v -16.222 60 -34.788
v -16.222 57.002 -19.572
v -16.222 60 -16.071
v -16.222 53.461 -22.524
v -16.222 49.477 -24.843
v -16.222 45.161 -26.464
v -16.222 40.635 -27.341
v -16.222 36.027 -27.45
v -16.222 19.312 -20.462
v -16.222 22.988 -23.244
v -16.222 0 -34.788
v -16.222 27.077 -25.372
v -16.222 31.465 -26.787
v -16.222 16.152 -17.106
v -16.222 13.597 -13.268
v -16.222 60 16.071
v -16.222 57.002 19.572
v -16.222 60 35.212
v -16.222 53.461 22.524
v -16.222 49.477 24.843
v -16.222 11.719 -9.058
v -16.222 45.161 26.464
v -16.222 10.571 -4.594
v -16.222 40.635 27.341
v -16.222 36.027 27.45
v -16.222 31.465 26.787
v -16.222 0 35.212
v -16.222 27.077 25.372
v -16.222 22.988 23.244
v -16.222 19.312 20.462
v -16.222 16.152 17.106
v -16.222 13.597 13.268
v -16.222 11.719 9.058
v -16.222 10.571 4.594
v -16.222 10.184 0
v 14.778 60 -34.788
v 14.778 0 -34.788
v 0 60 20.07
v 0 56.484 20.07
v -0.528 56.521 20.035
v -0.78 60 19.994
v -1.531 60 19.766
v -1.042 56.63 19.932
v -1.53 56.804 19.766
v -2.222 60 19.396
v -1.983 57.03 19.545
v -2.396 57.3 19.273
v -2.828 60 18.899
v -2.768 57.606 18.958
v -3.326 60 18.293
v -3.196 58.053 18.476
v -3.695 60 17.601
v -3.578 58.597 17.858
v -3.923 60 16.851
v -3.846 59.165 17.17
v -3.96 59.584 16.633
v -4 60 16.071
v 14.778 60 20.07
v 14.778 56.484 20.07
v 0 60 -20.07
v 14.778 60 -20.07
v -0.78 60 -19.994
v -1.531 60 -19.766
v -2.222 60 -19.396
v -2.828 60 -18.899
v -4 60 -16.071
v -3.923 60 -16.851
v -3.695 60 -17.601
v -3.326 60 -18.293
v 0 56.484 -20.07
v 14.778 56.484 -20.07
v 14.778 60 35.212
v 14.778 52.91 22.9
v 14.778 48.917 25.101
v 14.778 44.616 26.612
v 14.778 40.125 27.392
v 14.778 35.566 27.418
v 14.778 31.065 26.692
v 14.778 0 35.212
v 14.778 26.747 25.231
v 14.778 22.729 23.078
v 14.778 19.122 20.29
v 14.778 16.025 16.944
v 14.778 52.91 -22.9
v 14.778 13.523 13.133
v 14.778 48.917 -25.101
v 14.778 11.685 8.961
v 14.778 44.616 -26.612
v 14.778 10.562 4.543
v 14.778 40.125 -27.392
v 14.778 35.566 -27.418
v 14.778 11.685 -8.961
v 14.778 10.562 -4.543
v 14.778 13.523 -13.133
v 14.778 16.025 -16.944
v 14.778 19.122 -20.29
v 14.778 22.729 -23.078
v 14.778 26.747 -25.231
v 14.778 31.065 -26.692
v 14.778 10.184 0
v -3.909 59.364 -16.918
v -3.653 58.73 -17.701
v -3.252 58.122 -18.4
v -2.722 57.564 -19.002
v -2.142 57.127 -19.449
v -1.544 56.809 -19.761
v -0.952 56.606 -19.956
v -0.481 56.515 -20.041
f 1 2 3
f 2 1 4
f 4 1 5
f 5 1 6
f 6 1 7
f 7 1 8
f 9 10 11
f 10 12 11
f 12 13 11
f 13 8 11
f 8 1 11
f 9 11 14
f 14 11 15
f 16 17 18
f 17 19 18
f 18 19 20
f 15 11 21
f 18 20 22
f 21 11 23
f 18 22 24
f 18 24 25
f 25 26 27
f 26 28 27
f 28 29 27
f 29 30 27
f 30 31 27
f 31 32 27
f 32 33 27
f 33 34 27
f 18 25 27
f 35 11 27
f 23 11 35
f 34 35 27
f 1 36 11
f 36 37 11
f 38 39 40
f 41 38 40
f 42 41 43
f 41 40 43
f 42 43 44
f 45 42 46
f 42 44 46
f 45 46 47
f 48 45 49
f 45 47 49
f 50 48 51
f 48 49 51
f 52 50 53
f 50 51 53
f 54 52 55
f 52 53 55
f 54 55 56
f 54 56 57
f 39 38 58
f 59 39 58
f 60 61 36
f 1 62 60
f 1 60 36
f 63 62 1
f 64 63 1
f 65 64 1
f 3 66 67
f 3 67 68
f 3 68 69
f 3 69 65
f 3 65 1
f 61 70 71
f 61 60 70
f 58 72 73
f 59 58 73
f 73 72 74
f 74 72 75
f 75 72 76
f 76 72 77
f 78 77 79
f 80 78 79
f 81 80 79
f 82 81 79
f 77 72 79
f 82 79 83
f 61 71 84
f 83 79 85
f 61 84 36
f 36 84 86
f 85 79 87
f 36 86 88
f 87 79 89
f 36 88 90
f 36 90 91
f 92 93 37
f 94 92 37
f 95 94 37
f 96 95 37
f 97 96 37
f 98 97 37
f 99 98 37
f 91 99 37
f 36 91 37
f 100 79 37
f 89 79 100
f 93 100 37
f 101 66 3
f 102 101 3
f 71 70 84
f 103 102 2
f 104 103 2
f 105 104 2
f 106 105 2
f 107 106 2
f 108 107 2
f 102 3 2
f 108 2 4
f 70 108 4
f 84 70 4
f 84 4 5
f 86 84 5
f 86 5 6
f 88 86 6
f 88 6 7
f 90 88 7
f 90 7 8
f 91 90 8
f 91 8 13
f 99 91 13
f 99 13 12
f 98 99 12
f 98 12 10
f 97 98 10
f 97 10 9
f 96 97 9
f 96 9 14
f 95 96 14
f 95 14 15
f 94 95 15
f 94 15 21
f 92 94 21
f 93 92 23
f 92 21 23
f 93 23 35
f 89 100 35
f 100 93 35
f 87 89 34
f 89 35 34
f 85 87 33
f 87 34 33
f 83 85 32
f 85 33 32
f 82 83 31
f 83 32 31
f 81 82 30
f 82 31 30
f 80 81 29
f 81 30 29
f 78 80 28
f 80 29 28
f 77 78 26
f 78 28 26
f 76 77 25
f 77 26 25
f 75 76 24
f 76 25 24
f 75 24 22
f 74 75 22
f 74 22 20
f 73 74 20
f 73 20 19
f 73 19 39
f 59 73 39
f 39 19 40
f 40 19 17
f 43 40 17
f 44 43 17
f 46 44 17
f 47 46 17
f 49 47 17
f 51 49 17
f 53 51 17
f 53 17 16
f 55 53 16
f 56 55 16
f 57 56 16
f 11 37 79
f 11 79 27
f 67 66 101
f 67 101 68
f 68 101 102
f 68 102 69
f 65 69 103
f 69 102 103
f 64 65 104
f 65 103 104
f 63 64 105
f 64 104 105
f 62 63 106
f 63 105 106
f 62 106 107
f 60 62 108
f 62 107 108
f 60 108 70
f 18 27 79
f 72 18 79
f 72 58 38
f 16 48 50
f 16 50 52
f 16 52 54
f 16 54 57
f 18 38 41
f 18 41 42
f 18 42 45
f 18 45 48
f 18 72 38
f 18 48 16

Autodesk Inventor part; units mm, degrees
ref_plane "YZ Plane" through (0, 0, 0) normal (1, 0, 0) x (0, 1, 0)
ref_plane "XZ Plane" through (0, 0, 0) normal (0, 1, 0) x (-1, 0, 0)
ref_plane "XY Plane" through (0, 0, 0) normal (0, 0, 1) x (1, 0, 0)
sketch "Sketch1" plane through (0, 0, 0) normal (0, 1, 0) x (-1, 0, 0)
  line L0 (16.2222, 35.2121) -> (-14.7778, 35.2121)
  line L1 (-14.7778, 35.2121) -> (-14.7778, -34.7879)
  line L2 (-14.7778, -34.7879) -> (16.2222, -34.7879)
  line L3 (16.2222, -34.7879) -> (16.2222, 35.2121)
  point P0 (0, 0)
  dimension "d0" = 70
  dimension "d1" = 31
extrude "Extrusion1" add sketch "Sketch1" along normal blind 60
sketch "Sketch2" plane through (0, 60, 0) normal (0, 1, 0) x (1, 0, 0)
  line L0 (0, -17.35) -> (0, 17.35)
  point P0 (0, 0)
  point P1 (0, 0)
  dimension "d4" = 34.7
sketch "Sketch3" plane through (14.7778, 0, 35.2121) normal (1, 0, 0) x (0, 0, -1)
  circle A0 centre (35.2121, 37.6844) radius 27.5
  point P0 (35.2121, 0)
  dimension "d5" = 55
hole "Hole1" at (14.7778, 37.6844, 0) direction (-1, 0, 0) diameter 55 end through all
sketch "Sketch4" plane through (0, 60, 0) normal (0, 1, 0) x (1, 0, 0)
  line L0 (14.7778, -16.0705) -> (-16.2222, -16.0705) projected
  circle A0 centre (0, -16.0705) radius 4
  point P0 (0, 0)
  dimension "d13" = 8
sketch "Sketch5" plane through (0, 60, 0) normal (0, 1, 0) x (1, 0, 0)
  line L0 (-16.2222, 16.0705) -> (14.7778, 16.0705) projected
  circle A0 centre (0, 16.0705) radius 4
  point P0 (0, 0)
  dimension "d14" = 8
hole "Hole2" at (0, 60, 16.0705) direction (0, -1, 0) diameter 8 depth 8 tip angle 118
hole "Hole3" at (0, 60, -16.0705) direction (0, -1, 0) diameter 8 depth 8 tip angle 118
sketch "Sketch6" plane through (0, 60, 0) normal (0, 1, 0) x (1, 0, 0)
  arc A0 (-4, -16.0705) -> (4, -16.0705) centre (0, -16.0705) ccw projected
  line L0 (0, -20.0705) -> (14.7778, -20.0705)
  line L1 (14.7778, -20.0705) -> (14.7778, -16.0705)
  line L2 (14.7778, -16.0705) -> (0, -16.0705)
  line L3 (14.7778, -16.0705) -> (4, -16.0705) projected
  line L4 (0, -16.0705) -> (0, -20.0705)
  point P0 (0, 0)
extrude "Extrusion2" cut sketch "Sketch6" against normal blind 10 contours A0 L2 L1 L0
sketch "Sketch7" plane through (0, 60, 0) normal (0, 1, 0) x (1, 0, 0)
  arc A0 (4, 16.0705) -> (-4, 16.0705) centre (0, 16.0705) ccw projected
  line L0 (0, 20.0705) -> (14.7778, 20.0705)
  line L1 (14.7778, 16.0705) -> (14.7778, 34.7879) projected
  line L2 (14.7778, 20.0705) -> (14.7778, 16.0705)
  line L3 (14.7778, 16.0705) -> (0, 16.0705)
  line L4 (0, 16.0705) -> (0, 20.0705)
  point P0 (0, 0)
extrude "Extrusion3" cut sketch "Sketch7" against normal blind 10
properties part number "Noke_holder"
